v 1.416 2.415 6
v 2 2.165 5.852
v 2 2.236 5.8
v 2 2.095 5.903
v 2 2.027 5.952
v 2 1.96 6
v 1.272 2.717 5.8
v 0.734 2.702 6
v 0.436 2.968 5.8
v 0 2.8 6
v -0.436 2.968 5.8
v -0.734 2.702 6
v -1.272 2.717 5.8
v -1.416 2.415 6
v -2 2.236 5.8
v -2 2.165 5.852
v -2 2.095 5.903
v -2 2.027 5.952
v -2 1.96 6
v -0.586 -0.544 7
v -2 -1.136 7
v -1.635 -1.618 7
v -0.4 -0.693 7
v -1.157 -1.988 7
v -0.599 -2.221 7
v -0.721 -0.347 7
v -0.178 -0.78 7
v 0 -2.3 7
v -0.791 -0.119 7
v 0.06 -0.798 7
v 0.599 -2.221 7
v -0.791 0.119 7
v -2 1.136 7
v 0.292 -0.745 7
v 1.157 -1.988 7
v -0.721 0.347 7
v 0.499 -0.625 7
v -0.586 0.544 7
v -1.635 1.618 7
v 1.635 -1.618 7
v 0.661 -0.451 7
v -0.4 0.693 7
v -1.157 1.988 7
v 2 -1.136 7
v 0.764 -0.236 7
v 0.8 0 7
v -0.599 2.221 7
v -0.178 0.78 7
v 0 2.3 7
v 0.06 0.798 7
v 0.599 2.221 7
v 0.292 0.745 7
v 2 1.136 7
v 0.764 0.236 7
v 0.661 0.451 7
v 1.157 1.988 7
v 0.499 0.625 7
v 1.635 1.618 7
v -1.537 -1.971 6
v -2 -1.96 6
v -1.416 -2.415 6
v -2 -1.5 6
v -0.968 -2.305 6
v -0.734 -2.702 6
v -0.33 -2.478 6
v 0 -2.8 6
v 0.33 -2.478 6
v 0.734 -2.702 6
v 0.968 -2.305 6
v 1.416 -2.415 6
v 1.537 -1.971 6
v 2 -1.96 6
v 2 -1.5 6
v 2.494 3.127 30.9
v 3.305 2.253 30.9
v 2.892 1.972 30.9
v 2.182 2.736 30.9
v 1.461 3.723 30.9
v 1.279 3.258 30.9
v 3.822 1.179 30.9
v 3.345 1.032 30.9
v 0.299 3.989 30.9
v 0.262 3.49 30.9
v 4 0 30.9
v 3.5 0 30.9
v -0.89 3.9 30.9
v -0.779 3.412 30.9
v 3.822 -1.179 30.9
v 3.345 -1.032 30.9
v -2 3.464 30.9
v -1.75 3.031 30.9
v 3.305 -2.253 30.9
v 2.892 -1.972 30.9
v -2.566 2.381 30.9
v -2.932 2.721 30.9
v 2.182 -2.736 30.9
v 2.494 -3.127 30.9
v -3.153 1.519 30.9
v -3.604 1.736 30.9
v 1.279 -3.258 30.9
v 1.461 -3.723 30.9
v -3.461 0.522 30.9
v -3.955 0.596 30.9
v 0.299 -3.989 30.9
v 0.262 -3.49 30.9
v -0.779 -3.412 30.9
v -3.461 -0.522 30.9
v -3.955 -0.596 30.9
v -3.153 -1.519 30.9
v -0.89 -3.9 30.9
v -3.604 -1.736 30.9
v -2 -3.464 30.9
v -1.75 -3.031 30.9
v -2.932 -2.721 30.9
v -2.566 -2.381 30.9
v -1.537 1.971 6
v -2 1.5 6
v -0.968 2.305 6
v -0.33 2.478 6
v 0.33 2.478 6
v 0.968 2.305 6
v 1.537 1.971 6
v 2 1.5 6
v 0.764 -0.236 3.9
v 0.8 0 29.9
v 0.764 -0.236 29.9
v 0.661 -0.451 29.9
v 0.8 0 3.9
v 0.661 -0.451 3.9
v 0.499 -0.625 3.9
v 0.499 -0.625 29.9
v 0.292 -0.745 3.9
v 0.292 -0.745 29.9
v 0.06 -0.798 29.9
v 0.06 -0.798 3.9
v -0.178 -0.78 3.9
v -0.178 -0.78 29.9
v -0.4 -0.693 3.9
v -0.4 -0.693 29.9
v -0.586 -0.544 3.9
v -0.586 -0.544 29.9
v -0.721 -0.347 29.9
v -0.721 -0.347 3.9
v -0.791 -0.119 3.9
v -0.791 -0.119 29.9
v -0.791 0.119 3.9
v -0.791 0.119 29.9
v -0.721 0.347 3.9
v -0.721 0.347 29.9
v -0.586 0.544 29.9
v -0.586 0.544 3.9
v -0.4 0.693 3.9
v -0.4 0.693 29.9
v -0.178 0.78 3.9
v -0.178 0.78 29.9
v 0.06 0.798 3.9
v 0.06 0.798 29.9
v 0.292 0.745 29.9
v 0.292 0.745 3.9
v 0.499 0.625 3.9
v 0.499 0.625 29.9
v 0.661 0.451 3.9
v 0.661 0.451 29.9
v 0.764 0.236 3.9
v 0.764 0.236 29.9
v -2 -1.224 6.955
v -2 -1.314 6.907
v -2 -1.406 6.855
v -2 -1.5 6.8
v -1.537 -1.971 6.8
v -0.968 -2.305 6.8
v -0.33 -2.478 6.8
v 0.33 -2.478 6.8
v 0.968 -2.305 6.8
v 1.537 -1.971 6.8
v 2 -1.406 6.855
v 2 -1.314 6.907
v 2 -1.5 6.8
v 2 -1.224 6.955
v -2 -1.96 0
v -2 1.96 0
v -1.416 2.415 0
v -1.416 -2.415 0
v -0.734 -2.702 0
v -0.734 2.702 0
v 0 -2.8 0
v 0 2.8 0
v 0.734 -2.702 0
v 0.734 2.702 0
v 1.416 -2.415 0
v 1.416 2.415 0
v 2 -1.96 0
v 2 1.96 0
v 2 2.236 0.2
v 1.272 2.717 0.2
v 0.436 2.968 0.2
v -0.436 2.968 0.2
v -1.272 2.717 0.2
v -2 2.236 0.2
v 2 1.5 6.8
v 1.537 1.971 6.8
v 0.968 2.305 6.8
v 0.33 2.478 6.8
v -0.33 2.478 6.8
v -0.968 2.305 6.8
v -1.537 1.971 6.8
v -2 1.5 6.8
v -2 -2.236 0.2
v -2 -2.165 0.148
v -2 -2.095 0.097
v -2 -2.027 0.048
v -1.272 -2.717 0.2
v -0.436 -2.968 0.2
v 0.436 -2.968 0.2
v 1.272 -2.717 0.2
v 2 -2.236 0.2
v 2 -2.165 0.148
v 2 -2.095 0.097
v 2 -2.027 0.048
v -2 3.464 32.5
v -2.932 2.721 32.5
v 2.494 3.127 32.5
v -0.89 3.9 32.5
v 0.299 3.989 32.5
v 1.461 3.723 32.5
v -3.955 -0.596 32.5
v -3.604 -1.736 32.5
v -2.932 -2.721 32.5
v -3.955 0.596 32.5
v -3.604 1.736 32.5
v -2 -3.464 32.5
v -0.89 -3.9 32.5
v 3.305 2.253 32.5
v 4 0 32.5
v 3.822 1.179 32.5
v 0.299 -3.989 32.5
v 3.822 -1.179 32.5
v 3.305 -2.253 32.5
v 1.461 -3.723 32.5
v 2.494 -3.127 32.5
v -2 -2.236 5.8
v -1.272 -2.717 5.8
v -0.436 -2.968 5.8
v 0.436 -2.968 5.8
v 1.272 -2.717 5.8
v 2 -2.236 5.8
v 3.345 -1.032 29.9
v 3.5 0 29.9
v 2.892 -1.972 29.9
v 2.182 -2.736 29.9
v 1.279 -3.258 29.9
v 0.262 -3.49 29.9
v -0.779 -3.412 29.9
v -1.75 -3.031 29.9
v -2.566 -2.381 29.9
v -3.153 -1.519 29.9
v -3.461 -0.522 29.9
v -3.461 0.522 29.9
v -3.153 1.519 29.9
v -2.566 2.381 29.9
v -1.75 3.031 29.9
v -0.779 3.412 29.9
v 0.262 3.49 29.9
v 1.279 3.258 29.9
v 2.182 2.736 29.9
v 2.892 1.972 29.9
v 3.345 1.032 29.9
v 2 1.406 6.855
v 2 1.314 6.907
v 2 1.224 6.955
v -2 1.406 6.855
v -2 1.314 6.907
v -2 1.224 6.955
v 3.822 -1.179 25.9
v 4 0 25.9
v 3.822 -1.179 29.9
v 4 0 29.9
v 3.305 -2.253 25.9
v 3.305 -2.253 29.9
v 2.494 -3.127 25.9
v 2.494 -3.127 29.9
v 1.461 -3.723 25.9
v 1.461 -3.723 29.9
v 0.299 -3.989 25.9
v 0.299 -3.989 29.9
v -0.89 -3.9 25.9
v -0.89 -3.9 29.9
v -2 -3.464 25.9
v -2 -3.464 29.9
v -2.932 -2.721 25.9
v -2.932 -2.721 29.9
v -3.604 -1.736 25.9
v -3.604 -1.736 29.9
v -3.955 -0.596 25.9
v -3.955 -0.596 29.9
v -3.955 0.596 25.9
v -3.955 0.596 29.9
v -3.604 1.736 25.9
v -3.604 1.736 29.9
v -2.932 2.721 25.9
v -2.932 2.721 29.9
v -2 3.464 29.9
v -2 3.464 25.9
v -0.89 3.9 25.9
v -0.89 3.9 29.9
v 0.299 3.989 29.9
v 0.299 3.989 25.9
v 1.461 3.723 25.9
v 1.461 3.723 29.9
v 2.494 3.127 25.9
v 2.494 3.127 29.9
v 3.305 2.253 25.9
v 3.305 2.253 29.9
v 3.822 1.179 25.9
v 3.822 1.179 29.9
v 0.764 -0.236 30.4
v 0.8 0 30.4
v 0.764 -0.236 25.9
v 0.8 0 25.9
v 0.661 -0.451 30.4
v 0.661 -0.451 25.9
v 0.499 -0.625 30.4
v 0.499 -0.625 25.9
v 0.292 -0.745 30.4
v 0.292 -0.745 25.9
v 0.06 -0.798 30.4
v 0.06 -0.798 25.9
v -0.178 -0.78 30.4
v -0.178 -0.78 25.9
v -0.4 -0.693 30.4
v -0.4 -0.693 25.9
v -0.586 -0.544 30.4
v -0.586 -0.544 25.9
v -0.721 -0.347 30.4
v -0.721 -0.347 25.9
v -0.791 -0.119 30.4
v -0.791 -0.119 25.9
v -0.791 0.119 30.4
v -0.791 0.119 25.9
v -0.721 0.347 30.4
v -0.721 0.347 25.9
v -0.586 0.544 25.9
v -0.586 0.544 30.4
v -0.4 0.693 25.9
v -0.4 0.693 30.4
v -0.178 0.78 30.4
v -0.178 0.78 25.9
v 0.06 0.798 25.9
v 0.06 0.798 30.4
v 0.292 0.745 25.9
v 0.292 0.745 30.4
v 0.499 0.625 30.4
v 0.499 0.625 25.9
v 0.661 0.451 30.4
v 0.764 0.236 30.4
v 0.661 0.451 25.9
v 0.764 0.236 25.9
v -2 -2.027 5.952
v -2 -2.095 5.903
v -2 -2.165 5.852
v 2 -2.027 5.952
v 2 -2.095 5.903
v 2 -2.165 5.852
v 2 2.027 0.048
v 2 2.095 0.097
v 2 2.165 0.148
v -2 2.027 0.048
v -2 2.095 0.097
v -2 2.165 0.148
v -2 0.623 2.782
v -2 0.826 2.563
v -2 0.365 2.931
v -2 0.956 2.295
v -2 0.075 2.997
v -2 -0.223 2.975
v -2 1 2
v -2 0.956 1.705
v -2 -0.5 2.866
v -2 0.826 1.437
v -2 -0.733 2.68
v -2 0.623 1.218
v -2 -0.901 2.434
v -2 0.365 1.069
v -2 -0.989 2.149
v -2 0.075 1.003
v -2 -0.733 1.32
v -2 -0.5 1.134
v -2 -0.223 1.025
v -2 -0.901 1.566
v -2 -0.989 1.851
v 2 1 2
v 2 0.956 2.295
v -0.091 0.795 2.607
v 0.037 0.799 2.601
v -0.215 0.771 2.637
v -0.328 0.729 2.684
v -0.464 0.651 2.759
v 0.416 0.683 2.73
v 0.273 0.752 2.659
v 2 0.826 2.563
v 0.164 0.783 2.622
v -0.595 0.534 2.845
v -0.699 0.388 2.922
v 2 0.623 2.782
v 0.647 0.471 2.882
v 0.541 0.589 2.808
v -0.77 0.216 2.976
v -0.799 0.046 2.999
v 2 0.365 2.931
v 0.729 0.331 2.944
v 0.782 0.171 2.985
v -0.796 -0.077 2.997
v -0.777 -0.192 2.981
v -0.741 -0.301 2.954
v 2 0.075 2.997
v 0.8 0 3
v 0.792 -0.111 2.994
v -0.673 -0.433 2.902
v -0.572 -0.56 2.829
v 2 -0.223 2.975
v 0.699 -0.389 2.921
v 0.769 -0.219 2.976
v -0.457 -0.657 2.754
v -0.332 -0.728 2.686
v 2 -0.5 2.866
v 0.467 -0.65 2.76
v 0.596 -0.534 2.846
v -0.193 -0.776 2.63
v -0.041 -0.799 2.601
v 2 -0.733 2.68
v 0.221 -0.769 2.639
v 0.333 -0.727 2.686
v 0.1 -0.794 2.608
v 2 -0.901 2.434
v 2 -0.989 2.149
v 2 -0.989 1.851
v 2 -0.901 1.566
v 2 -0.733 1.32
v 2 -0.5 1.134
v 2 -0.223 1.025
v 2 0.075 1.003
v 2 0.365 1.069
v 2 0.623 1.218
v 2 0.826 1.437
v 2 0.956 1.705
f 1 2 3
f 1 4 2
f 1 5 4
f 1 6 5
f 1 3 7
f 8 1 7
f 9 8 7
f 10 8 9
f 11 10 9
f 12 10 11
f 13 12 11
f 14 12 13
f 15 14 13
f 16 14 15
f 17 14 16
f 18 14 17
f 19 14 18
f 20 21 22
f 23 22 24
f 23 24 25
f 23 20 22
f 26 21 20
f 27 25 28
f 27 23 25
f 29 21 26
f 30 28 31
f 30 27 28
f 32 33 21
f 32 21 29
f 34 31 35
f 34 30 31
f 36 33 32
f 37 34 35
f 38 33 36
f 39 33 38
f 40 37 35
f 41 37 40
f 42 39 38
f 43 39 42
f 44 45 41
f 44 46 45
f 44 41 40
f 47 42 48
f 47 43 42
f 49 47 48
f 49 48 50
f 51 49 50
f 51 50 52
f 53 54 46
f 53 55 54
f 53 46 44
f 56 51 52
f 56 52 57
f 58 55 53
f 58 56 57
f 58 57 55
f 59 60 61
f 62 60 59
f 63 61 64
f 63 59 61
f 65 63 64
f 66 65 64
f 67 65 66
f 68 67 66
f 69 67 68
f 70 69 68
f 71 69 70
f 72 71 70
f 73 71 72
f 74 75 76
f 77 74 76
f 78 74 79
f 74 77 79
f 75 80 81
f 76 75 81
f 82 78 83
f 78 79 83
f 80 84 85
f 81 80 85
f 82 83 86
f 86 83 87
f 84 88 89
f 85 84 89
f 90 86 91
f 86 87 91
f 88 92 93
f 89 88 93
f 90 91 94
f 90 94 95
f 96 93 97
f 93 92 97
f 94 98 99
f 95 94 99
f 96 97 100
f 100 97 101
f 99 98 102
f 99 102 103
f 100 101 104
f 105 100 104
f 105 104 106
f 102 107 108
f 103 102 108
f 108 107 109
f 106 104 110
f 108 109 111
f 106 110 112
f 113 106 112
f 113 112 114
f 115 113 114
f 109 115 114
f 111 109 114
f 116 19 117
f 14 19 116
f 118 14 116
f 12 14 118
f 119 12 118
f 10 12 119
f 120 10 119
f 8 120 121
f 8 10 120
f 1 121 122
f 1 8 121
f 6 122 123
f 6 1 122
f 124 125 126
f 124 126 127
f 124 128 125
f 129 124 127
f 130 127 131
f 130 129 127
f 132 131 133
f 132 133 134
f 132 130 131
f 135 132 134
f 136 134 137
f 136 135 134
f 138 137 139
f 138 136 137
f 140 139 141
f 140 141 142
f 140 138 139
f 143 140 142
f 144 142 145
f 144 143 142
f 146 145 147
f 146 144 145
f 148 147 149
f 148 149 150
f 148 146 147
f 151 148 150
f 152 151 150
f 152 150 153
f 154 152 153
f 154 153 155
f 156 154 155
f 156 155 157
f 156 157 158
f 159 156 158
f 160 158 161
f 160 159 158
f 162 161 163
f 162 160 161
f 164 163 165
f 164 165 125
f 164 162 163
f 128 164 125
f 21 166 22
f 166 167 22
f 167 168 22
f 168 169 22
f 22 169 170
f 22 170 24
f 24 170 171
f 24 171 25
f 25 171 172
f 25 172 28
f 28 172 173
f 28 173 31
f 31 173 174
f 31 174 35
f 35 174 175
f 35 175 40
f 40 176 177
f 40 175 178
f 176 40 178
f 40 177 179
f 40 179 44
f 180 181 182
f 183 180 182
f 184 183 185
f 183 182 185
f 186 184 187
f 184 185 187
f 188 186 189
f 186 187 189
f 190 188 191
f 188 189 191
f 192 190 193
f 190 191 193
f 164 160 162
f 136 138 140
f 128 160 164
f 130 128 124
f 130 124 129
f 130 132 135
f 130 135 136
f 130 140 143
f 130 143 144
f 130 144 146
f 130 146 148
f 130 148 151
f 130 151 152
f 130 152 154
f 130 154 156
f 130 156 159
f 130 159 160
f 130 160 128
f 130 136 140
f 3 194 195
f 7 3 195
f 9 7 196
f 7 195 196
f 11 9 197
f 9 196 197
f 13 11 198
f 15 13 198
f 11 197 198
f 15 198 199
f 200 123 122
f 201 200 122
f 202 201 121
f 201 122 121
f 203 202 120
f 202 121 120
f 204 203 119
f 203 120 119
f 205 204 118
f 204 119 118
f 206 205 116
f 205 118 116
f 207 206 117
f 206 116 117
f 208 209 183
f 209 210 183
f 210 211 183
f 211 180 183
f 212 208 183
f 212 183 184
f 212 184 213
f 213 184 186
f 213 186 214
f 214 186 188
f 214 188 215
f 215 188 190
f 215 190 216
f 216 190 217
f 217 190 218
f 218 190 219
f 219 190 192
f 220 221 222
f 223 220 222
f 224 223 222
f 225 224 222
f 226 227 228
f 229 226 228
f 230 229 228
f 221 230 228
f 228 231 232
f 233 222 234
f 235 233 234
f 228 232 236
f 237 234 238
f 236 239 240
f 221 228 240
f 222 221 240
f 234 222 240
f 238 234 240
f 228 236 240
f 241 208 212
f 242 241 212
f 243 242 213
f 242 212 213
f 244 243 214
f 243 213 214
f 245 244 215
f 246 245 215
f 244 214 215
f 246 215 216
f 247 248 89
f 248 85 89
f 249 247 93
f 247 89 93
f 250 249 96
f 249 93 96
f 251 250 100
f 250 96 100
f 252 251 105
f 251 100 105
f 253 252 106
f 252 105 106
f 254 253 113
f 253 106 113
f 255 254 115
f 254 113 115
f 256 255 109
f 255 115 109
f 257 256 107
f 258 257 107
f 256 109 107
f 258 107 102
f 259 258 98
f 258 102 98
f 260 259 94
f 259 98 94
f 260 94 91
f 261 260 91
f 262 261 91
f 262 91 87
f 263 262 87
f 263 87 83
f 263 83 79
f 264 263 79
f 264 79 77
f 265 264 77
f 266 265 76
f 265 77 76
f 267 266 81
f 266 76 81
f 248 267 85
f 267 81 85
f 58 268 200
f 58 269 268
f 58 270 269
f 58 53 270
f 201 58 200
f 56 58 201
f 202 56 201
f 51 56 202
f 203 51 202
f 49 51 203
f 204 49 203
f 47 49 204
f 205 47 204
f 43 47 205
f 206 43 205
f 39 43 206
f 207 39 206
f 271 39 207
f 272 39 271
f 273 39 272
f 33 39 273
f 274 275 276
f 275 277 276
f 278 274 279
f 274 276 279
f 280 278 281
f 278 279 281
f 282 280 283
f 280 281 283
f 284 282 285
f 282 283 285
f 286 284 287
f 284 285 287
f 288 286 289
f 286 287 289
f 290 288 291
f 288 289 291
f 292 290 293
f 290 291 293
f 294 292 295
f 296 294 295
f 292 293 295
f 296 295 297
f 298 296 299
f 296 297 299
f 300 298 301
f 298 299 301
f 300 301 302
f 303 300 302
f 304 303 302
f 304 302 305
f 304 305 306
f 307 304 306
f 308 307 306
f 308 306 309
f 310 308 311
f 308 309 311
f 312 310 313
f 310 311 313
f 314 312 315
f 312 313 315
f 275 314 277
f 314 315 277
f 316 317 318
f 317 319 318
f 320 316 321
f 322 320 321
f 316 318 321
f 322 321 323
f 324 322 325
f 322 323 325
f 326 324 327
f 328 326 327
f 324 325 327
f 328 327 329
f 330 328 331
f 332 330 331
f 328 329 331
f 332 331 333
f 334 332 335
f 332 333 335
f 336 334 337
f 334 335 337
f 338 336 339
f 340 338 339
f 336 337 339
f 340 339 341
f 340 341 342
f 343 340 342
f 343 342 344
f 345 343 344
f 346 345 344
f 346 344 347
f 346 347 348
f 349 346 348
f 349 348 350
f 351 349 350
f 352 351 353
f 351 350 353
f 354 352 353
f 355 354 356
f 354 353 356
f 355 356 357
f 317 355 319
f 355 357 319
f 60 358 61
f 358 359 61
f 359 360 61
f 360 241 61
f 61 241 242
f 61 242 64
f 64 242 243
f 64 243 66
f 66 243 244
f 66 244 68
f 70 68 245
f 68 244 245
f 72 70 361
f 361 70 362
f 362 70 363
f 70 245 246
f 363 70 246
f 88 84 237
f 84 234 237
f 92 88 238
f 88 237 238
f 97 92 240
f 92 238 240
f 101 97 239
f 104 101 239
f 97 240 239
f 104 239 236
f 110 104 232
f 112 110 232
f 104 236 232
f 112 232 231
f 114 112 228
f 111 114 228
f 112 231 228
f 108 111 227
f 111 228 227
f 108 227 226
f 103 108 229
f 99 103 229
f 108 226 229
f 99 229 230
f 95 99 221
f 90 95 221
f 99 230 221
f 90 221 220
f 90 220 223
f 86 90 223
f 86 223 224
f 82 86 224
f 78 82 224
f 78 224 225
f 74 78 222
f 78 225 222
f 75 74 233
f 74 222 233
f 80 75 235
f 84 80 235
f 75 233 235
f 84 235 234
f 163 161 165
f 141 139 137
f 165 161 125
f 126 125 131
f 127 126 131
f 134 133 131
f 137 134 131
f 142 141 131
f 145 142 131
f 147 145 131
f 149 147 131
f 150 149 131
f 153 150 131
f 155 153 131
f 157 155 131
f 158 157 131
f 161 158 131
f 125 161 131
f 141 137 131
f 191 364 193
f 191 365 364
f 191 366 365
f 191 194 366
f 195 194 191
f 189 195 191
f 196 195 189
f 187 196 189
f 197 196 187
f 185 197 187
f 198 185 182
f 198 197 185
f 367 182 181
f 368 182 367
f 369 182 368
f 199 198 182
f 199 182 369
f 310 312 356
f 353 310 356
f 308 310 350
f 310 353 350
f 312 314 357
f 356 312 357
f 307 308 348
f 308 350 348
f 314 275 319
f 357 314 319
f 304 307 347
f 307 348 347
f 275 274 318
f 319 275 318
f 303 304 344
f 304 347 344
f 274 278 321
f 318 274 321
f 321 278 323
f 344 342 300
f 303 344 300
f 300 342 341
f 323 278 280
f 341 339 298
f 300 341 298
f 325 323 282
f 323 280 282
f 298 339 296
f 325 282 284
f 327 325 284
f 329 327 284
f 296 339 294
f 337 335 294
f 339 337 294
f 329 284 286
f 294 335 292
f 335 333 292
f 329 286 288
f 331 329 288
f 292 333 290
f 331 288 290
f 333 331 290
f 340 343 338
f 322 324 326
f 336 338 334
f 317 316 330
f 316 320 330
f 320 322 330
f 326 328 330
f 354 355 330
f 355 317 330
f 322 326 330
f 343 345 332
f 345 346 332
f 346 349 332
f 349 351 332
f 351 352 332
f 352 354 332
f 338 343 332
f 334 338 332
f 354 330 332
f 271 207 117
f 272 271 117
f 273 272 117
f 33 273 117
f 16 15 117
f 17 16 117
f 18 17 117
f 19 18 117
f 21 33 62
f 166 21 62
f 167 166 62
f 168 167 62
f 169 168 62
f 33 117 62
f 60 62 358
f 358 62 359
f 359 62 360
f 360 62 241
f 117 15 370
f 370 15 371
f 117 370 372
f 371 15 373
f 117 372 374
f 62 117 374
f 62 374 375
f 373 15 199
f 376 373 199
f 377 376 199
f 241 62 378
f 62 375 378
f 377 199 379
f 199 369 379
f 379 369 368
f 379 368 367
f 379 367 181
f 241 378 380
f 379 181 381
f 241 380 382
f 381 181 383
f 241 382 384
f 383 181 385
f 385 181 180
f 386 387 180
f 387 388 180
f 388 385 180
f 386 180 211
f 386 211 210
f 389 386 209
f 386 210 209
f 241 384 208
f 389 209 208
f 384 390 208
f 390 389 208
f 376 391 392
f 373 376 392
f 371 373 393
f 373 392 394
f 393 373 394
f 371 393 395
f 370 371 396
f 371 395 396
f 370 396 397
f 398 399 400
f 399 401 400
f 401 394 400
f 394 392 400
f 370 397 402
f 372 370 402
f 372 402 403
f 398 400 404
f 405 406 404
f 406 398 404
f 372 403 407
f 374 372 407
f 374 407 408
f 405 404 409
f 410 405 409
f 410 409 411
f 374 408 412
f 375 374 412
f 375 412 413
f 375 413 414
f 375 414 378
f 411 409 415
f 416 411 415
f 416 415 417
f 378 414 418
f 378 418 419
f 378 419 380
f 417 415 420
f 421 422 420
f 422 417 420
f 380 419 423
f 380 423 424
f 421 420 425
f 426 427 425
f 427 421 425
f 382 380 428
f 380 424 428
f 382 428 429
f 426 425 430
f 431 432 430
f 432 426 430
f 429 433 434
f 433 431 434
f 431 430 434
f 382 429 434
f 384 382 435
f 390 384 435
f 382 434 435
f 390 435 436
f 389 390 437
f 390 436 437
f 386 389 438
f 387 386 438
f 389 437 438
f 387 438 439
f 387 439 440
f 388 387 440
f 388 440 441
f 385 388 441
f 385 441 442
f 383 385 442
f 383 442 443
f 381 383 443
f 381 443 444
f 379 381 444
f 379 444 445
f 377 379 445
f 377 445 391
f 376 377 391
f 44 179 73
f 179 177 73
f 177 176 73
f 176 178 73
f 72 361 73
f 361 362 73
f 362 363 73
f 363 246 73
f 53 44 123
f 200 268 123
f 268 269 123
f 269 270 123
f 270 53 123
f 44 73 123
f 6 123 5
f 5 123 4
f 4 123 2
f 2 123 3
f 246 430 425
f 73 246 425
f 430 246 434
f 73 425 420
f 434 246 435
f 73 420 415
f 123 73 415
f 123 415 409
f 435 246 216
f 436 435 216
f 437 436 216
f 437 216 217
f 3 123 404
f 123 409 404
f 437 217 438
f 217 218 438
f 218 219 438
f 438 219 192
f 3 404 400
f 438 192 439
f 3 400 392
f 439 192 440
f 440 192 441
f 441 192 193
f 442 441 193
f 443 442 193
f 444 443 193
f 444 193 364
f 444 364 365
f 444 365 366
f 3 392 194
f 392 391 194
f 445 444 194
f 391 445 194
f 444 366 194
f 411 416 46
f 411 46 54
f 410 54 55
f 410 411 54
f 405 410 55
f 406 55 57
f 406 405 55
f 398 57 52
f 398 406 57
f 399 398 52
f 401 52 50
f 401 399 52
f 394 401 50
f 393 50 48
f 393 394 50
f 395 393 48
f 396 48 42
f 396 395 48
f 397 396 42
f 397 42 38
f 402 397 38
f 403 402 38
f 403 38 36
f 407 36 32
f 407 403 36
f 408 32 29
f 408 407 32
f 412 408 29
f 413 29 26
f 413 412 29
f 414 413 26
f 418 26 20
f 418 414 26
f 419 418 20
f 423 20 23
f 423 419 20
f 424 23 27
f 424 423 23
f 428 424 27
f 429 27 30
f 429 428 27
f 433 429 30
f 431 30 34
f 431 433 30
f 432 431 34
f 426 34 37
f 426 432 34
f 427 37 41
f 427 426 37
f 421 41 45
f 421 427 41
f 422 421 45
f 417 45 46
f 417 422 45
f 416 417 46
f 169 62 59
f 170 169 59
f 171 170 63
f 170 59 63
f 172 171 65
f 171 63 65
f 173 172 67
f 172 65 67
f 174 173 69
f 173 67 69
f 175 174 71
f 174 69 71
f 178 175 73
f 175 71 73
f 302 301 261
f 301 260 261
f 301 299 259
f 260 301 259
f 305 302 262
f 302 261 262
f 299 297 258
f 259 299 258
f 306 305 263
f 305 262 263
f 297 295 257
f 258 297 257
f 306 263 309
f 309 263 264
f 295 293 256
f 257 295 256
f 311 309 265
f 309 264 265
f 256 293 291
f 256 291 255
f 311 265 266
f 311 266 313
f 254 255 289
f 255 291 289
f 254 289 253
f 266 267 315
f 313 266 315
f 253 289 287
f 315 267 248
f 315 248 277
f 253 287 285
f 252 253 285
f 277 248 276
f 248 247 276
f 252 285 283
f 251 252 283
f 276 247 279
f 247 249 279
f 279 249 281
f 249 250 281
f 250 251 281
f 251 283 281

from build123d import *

# Parameters (mm, degrees)
F2_R          = 0.8
F3_DEPTH      = 22
F3_DEPTH_BACK = 4
F5_DEPTH      = 6
F6_R          = 0.8
F7_DEPTH      = 4
F8_DEPTH      = 1
F9_SIZE       = 0.2
F10_R         = 1
F11_DEPTH     = 6.001


with BuildPart() as f1:
    # F0 (on Front) → F1 (revolve)
    with BuildSketch(Plane.XZ):
        Polygon((4, 32.5), (0, 32.5), (0, 30.4), (0.8, 30.4), (0.8, 25.9), (4, 25.9), (4, 29.9), (3.5, 29.9), (3.5, 30.9), (4, 30.9), align=None)
    revolve(axis=Axis((0, 0, 1.0303046881), (0, 0, -1)))


with BuildPart() as f3:
    # F2 (on face) → F3 (new body, two sides)
    with BuildSketch(Plane(origin=(0, 0, 25.9), x_dir=(1, 0, 0), z_dir=(0, 0, -1))) as f3_sk:
        Circle(F2_R)
    extrude(amount=F3_DEPTH)
    extrude(f3_sk.sketch, amount=-F3_DEPTH_BACK)


with BuildPart() as f5:
    # F4 (on Top) → F5 (new body)
    with BuildSketch(Plane.XY):
        with BuildLine():
            Line((2, -2.2360679775), (2, 2.2360679775))
            ThreePointArc((2, 2.2360679775), (0, 3), (-2, 2.2360679775))
            Line((-2, 2.2360679775), (-2, -2.2360679775))
            ThreePointArc((-2, -2.2360679775), (0, -3), (2, -2.2360679775))
        make_face()
    extrude(amount=F5_DEPTH)

    # F6 (on face) → F7 (cut)
    with BuildSketch(Plane.XY.offset(6)):
        Circle(F6_R)
    extrude(amount=-F7_DEPTH, mode=Mode.SUBTRACT)

    # F6 (on face) → F8 (join)
    with BuildSketch(Plane.XY.offset(6)):
        with BuildLine():
            ThreePointArc((2, 1.5), (0, 2.5), (-2, 1.5))
            Line((-2, 1.5), (-2, -1.5))
            ThreePointArc((-2, -1.5), (0, -2.5), (2, -1.5))
            Line((2, -1.5), (2, 1.5))
        make_face()
        Circle(F6_R, mode=Mode.SUBTRACT)
    extrude(amount=F8_DEPTH)

    # F9
    f9_edges = [f5.edges().sort_by_distance(p)[0] for p in [
        (0, -3, 6),
        (0, -2.5, 7),
        (0, 3, 6),
        (0, 2.5, 7),
        (0, -3, 0),
        (0, 3, 0),
    ]]
    chamfer(f9_edges, length=F9_SIZE)

    # F10 (on face) → F11 (cut, through all)
    with BuildSketch(Plane.YZ.offset(2)):
        with Locations((0, 2)):
            Circle(F10_R)
    extrude(amount=-F11_DEPTH, mode=Mode.SUBTRACT)


solid = Compound([f1.part, f3.part, f5.part])
